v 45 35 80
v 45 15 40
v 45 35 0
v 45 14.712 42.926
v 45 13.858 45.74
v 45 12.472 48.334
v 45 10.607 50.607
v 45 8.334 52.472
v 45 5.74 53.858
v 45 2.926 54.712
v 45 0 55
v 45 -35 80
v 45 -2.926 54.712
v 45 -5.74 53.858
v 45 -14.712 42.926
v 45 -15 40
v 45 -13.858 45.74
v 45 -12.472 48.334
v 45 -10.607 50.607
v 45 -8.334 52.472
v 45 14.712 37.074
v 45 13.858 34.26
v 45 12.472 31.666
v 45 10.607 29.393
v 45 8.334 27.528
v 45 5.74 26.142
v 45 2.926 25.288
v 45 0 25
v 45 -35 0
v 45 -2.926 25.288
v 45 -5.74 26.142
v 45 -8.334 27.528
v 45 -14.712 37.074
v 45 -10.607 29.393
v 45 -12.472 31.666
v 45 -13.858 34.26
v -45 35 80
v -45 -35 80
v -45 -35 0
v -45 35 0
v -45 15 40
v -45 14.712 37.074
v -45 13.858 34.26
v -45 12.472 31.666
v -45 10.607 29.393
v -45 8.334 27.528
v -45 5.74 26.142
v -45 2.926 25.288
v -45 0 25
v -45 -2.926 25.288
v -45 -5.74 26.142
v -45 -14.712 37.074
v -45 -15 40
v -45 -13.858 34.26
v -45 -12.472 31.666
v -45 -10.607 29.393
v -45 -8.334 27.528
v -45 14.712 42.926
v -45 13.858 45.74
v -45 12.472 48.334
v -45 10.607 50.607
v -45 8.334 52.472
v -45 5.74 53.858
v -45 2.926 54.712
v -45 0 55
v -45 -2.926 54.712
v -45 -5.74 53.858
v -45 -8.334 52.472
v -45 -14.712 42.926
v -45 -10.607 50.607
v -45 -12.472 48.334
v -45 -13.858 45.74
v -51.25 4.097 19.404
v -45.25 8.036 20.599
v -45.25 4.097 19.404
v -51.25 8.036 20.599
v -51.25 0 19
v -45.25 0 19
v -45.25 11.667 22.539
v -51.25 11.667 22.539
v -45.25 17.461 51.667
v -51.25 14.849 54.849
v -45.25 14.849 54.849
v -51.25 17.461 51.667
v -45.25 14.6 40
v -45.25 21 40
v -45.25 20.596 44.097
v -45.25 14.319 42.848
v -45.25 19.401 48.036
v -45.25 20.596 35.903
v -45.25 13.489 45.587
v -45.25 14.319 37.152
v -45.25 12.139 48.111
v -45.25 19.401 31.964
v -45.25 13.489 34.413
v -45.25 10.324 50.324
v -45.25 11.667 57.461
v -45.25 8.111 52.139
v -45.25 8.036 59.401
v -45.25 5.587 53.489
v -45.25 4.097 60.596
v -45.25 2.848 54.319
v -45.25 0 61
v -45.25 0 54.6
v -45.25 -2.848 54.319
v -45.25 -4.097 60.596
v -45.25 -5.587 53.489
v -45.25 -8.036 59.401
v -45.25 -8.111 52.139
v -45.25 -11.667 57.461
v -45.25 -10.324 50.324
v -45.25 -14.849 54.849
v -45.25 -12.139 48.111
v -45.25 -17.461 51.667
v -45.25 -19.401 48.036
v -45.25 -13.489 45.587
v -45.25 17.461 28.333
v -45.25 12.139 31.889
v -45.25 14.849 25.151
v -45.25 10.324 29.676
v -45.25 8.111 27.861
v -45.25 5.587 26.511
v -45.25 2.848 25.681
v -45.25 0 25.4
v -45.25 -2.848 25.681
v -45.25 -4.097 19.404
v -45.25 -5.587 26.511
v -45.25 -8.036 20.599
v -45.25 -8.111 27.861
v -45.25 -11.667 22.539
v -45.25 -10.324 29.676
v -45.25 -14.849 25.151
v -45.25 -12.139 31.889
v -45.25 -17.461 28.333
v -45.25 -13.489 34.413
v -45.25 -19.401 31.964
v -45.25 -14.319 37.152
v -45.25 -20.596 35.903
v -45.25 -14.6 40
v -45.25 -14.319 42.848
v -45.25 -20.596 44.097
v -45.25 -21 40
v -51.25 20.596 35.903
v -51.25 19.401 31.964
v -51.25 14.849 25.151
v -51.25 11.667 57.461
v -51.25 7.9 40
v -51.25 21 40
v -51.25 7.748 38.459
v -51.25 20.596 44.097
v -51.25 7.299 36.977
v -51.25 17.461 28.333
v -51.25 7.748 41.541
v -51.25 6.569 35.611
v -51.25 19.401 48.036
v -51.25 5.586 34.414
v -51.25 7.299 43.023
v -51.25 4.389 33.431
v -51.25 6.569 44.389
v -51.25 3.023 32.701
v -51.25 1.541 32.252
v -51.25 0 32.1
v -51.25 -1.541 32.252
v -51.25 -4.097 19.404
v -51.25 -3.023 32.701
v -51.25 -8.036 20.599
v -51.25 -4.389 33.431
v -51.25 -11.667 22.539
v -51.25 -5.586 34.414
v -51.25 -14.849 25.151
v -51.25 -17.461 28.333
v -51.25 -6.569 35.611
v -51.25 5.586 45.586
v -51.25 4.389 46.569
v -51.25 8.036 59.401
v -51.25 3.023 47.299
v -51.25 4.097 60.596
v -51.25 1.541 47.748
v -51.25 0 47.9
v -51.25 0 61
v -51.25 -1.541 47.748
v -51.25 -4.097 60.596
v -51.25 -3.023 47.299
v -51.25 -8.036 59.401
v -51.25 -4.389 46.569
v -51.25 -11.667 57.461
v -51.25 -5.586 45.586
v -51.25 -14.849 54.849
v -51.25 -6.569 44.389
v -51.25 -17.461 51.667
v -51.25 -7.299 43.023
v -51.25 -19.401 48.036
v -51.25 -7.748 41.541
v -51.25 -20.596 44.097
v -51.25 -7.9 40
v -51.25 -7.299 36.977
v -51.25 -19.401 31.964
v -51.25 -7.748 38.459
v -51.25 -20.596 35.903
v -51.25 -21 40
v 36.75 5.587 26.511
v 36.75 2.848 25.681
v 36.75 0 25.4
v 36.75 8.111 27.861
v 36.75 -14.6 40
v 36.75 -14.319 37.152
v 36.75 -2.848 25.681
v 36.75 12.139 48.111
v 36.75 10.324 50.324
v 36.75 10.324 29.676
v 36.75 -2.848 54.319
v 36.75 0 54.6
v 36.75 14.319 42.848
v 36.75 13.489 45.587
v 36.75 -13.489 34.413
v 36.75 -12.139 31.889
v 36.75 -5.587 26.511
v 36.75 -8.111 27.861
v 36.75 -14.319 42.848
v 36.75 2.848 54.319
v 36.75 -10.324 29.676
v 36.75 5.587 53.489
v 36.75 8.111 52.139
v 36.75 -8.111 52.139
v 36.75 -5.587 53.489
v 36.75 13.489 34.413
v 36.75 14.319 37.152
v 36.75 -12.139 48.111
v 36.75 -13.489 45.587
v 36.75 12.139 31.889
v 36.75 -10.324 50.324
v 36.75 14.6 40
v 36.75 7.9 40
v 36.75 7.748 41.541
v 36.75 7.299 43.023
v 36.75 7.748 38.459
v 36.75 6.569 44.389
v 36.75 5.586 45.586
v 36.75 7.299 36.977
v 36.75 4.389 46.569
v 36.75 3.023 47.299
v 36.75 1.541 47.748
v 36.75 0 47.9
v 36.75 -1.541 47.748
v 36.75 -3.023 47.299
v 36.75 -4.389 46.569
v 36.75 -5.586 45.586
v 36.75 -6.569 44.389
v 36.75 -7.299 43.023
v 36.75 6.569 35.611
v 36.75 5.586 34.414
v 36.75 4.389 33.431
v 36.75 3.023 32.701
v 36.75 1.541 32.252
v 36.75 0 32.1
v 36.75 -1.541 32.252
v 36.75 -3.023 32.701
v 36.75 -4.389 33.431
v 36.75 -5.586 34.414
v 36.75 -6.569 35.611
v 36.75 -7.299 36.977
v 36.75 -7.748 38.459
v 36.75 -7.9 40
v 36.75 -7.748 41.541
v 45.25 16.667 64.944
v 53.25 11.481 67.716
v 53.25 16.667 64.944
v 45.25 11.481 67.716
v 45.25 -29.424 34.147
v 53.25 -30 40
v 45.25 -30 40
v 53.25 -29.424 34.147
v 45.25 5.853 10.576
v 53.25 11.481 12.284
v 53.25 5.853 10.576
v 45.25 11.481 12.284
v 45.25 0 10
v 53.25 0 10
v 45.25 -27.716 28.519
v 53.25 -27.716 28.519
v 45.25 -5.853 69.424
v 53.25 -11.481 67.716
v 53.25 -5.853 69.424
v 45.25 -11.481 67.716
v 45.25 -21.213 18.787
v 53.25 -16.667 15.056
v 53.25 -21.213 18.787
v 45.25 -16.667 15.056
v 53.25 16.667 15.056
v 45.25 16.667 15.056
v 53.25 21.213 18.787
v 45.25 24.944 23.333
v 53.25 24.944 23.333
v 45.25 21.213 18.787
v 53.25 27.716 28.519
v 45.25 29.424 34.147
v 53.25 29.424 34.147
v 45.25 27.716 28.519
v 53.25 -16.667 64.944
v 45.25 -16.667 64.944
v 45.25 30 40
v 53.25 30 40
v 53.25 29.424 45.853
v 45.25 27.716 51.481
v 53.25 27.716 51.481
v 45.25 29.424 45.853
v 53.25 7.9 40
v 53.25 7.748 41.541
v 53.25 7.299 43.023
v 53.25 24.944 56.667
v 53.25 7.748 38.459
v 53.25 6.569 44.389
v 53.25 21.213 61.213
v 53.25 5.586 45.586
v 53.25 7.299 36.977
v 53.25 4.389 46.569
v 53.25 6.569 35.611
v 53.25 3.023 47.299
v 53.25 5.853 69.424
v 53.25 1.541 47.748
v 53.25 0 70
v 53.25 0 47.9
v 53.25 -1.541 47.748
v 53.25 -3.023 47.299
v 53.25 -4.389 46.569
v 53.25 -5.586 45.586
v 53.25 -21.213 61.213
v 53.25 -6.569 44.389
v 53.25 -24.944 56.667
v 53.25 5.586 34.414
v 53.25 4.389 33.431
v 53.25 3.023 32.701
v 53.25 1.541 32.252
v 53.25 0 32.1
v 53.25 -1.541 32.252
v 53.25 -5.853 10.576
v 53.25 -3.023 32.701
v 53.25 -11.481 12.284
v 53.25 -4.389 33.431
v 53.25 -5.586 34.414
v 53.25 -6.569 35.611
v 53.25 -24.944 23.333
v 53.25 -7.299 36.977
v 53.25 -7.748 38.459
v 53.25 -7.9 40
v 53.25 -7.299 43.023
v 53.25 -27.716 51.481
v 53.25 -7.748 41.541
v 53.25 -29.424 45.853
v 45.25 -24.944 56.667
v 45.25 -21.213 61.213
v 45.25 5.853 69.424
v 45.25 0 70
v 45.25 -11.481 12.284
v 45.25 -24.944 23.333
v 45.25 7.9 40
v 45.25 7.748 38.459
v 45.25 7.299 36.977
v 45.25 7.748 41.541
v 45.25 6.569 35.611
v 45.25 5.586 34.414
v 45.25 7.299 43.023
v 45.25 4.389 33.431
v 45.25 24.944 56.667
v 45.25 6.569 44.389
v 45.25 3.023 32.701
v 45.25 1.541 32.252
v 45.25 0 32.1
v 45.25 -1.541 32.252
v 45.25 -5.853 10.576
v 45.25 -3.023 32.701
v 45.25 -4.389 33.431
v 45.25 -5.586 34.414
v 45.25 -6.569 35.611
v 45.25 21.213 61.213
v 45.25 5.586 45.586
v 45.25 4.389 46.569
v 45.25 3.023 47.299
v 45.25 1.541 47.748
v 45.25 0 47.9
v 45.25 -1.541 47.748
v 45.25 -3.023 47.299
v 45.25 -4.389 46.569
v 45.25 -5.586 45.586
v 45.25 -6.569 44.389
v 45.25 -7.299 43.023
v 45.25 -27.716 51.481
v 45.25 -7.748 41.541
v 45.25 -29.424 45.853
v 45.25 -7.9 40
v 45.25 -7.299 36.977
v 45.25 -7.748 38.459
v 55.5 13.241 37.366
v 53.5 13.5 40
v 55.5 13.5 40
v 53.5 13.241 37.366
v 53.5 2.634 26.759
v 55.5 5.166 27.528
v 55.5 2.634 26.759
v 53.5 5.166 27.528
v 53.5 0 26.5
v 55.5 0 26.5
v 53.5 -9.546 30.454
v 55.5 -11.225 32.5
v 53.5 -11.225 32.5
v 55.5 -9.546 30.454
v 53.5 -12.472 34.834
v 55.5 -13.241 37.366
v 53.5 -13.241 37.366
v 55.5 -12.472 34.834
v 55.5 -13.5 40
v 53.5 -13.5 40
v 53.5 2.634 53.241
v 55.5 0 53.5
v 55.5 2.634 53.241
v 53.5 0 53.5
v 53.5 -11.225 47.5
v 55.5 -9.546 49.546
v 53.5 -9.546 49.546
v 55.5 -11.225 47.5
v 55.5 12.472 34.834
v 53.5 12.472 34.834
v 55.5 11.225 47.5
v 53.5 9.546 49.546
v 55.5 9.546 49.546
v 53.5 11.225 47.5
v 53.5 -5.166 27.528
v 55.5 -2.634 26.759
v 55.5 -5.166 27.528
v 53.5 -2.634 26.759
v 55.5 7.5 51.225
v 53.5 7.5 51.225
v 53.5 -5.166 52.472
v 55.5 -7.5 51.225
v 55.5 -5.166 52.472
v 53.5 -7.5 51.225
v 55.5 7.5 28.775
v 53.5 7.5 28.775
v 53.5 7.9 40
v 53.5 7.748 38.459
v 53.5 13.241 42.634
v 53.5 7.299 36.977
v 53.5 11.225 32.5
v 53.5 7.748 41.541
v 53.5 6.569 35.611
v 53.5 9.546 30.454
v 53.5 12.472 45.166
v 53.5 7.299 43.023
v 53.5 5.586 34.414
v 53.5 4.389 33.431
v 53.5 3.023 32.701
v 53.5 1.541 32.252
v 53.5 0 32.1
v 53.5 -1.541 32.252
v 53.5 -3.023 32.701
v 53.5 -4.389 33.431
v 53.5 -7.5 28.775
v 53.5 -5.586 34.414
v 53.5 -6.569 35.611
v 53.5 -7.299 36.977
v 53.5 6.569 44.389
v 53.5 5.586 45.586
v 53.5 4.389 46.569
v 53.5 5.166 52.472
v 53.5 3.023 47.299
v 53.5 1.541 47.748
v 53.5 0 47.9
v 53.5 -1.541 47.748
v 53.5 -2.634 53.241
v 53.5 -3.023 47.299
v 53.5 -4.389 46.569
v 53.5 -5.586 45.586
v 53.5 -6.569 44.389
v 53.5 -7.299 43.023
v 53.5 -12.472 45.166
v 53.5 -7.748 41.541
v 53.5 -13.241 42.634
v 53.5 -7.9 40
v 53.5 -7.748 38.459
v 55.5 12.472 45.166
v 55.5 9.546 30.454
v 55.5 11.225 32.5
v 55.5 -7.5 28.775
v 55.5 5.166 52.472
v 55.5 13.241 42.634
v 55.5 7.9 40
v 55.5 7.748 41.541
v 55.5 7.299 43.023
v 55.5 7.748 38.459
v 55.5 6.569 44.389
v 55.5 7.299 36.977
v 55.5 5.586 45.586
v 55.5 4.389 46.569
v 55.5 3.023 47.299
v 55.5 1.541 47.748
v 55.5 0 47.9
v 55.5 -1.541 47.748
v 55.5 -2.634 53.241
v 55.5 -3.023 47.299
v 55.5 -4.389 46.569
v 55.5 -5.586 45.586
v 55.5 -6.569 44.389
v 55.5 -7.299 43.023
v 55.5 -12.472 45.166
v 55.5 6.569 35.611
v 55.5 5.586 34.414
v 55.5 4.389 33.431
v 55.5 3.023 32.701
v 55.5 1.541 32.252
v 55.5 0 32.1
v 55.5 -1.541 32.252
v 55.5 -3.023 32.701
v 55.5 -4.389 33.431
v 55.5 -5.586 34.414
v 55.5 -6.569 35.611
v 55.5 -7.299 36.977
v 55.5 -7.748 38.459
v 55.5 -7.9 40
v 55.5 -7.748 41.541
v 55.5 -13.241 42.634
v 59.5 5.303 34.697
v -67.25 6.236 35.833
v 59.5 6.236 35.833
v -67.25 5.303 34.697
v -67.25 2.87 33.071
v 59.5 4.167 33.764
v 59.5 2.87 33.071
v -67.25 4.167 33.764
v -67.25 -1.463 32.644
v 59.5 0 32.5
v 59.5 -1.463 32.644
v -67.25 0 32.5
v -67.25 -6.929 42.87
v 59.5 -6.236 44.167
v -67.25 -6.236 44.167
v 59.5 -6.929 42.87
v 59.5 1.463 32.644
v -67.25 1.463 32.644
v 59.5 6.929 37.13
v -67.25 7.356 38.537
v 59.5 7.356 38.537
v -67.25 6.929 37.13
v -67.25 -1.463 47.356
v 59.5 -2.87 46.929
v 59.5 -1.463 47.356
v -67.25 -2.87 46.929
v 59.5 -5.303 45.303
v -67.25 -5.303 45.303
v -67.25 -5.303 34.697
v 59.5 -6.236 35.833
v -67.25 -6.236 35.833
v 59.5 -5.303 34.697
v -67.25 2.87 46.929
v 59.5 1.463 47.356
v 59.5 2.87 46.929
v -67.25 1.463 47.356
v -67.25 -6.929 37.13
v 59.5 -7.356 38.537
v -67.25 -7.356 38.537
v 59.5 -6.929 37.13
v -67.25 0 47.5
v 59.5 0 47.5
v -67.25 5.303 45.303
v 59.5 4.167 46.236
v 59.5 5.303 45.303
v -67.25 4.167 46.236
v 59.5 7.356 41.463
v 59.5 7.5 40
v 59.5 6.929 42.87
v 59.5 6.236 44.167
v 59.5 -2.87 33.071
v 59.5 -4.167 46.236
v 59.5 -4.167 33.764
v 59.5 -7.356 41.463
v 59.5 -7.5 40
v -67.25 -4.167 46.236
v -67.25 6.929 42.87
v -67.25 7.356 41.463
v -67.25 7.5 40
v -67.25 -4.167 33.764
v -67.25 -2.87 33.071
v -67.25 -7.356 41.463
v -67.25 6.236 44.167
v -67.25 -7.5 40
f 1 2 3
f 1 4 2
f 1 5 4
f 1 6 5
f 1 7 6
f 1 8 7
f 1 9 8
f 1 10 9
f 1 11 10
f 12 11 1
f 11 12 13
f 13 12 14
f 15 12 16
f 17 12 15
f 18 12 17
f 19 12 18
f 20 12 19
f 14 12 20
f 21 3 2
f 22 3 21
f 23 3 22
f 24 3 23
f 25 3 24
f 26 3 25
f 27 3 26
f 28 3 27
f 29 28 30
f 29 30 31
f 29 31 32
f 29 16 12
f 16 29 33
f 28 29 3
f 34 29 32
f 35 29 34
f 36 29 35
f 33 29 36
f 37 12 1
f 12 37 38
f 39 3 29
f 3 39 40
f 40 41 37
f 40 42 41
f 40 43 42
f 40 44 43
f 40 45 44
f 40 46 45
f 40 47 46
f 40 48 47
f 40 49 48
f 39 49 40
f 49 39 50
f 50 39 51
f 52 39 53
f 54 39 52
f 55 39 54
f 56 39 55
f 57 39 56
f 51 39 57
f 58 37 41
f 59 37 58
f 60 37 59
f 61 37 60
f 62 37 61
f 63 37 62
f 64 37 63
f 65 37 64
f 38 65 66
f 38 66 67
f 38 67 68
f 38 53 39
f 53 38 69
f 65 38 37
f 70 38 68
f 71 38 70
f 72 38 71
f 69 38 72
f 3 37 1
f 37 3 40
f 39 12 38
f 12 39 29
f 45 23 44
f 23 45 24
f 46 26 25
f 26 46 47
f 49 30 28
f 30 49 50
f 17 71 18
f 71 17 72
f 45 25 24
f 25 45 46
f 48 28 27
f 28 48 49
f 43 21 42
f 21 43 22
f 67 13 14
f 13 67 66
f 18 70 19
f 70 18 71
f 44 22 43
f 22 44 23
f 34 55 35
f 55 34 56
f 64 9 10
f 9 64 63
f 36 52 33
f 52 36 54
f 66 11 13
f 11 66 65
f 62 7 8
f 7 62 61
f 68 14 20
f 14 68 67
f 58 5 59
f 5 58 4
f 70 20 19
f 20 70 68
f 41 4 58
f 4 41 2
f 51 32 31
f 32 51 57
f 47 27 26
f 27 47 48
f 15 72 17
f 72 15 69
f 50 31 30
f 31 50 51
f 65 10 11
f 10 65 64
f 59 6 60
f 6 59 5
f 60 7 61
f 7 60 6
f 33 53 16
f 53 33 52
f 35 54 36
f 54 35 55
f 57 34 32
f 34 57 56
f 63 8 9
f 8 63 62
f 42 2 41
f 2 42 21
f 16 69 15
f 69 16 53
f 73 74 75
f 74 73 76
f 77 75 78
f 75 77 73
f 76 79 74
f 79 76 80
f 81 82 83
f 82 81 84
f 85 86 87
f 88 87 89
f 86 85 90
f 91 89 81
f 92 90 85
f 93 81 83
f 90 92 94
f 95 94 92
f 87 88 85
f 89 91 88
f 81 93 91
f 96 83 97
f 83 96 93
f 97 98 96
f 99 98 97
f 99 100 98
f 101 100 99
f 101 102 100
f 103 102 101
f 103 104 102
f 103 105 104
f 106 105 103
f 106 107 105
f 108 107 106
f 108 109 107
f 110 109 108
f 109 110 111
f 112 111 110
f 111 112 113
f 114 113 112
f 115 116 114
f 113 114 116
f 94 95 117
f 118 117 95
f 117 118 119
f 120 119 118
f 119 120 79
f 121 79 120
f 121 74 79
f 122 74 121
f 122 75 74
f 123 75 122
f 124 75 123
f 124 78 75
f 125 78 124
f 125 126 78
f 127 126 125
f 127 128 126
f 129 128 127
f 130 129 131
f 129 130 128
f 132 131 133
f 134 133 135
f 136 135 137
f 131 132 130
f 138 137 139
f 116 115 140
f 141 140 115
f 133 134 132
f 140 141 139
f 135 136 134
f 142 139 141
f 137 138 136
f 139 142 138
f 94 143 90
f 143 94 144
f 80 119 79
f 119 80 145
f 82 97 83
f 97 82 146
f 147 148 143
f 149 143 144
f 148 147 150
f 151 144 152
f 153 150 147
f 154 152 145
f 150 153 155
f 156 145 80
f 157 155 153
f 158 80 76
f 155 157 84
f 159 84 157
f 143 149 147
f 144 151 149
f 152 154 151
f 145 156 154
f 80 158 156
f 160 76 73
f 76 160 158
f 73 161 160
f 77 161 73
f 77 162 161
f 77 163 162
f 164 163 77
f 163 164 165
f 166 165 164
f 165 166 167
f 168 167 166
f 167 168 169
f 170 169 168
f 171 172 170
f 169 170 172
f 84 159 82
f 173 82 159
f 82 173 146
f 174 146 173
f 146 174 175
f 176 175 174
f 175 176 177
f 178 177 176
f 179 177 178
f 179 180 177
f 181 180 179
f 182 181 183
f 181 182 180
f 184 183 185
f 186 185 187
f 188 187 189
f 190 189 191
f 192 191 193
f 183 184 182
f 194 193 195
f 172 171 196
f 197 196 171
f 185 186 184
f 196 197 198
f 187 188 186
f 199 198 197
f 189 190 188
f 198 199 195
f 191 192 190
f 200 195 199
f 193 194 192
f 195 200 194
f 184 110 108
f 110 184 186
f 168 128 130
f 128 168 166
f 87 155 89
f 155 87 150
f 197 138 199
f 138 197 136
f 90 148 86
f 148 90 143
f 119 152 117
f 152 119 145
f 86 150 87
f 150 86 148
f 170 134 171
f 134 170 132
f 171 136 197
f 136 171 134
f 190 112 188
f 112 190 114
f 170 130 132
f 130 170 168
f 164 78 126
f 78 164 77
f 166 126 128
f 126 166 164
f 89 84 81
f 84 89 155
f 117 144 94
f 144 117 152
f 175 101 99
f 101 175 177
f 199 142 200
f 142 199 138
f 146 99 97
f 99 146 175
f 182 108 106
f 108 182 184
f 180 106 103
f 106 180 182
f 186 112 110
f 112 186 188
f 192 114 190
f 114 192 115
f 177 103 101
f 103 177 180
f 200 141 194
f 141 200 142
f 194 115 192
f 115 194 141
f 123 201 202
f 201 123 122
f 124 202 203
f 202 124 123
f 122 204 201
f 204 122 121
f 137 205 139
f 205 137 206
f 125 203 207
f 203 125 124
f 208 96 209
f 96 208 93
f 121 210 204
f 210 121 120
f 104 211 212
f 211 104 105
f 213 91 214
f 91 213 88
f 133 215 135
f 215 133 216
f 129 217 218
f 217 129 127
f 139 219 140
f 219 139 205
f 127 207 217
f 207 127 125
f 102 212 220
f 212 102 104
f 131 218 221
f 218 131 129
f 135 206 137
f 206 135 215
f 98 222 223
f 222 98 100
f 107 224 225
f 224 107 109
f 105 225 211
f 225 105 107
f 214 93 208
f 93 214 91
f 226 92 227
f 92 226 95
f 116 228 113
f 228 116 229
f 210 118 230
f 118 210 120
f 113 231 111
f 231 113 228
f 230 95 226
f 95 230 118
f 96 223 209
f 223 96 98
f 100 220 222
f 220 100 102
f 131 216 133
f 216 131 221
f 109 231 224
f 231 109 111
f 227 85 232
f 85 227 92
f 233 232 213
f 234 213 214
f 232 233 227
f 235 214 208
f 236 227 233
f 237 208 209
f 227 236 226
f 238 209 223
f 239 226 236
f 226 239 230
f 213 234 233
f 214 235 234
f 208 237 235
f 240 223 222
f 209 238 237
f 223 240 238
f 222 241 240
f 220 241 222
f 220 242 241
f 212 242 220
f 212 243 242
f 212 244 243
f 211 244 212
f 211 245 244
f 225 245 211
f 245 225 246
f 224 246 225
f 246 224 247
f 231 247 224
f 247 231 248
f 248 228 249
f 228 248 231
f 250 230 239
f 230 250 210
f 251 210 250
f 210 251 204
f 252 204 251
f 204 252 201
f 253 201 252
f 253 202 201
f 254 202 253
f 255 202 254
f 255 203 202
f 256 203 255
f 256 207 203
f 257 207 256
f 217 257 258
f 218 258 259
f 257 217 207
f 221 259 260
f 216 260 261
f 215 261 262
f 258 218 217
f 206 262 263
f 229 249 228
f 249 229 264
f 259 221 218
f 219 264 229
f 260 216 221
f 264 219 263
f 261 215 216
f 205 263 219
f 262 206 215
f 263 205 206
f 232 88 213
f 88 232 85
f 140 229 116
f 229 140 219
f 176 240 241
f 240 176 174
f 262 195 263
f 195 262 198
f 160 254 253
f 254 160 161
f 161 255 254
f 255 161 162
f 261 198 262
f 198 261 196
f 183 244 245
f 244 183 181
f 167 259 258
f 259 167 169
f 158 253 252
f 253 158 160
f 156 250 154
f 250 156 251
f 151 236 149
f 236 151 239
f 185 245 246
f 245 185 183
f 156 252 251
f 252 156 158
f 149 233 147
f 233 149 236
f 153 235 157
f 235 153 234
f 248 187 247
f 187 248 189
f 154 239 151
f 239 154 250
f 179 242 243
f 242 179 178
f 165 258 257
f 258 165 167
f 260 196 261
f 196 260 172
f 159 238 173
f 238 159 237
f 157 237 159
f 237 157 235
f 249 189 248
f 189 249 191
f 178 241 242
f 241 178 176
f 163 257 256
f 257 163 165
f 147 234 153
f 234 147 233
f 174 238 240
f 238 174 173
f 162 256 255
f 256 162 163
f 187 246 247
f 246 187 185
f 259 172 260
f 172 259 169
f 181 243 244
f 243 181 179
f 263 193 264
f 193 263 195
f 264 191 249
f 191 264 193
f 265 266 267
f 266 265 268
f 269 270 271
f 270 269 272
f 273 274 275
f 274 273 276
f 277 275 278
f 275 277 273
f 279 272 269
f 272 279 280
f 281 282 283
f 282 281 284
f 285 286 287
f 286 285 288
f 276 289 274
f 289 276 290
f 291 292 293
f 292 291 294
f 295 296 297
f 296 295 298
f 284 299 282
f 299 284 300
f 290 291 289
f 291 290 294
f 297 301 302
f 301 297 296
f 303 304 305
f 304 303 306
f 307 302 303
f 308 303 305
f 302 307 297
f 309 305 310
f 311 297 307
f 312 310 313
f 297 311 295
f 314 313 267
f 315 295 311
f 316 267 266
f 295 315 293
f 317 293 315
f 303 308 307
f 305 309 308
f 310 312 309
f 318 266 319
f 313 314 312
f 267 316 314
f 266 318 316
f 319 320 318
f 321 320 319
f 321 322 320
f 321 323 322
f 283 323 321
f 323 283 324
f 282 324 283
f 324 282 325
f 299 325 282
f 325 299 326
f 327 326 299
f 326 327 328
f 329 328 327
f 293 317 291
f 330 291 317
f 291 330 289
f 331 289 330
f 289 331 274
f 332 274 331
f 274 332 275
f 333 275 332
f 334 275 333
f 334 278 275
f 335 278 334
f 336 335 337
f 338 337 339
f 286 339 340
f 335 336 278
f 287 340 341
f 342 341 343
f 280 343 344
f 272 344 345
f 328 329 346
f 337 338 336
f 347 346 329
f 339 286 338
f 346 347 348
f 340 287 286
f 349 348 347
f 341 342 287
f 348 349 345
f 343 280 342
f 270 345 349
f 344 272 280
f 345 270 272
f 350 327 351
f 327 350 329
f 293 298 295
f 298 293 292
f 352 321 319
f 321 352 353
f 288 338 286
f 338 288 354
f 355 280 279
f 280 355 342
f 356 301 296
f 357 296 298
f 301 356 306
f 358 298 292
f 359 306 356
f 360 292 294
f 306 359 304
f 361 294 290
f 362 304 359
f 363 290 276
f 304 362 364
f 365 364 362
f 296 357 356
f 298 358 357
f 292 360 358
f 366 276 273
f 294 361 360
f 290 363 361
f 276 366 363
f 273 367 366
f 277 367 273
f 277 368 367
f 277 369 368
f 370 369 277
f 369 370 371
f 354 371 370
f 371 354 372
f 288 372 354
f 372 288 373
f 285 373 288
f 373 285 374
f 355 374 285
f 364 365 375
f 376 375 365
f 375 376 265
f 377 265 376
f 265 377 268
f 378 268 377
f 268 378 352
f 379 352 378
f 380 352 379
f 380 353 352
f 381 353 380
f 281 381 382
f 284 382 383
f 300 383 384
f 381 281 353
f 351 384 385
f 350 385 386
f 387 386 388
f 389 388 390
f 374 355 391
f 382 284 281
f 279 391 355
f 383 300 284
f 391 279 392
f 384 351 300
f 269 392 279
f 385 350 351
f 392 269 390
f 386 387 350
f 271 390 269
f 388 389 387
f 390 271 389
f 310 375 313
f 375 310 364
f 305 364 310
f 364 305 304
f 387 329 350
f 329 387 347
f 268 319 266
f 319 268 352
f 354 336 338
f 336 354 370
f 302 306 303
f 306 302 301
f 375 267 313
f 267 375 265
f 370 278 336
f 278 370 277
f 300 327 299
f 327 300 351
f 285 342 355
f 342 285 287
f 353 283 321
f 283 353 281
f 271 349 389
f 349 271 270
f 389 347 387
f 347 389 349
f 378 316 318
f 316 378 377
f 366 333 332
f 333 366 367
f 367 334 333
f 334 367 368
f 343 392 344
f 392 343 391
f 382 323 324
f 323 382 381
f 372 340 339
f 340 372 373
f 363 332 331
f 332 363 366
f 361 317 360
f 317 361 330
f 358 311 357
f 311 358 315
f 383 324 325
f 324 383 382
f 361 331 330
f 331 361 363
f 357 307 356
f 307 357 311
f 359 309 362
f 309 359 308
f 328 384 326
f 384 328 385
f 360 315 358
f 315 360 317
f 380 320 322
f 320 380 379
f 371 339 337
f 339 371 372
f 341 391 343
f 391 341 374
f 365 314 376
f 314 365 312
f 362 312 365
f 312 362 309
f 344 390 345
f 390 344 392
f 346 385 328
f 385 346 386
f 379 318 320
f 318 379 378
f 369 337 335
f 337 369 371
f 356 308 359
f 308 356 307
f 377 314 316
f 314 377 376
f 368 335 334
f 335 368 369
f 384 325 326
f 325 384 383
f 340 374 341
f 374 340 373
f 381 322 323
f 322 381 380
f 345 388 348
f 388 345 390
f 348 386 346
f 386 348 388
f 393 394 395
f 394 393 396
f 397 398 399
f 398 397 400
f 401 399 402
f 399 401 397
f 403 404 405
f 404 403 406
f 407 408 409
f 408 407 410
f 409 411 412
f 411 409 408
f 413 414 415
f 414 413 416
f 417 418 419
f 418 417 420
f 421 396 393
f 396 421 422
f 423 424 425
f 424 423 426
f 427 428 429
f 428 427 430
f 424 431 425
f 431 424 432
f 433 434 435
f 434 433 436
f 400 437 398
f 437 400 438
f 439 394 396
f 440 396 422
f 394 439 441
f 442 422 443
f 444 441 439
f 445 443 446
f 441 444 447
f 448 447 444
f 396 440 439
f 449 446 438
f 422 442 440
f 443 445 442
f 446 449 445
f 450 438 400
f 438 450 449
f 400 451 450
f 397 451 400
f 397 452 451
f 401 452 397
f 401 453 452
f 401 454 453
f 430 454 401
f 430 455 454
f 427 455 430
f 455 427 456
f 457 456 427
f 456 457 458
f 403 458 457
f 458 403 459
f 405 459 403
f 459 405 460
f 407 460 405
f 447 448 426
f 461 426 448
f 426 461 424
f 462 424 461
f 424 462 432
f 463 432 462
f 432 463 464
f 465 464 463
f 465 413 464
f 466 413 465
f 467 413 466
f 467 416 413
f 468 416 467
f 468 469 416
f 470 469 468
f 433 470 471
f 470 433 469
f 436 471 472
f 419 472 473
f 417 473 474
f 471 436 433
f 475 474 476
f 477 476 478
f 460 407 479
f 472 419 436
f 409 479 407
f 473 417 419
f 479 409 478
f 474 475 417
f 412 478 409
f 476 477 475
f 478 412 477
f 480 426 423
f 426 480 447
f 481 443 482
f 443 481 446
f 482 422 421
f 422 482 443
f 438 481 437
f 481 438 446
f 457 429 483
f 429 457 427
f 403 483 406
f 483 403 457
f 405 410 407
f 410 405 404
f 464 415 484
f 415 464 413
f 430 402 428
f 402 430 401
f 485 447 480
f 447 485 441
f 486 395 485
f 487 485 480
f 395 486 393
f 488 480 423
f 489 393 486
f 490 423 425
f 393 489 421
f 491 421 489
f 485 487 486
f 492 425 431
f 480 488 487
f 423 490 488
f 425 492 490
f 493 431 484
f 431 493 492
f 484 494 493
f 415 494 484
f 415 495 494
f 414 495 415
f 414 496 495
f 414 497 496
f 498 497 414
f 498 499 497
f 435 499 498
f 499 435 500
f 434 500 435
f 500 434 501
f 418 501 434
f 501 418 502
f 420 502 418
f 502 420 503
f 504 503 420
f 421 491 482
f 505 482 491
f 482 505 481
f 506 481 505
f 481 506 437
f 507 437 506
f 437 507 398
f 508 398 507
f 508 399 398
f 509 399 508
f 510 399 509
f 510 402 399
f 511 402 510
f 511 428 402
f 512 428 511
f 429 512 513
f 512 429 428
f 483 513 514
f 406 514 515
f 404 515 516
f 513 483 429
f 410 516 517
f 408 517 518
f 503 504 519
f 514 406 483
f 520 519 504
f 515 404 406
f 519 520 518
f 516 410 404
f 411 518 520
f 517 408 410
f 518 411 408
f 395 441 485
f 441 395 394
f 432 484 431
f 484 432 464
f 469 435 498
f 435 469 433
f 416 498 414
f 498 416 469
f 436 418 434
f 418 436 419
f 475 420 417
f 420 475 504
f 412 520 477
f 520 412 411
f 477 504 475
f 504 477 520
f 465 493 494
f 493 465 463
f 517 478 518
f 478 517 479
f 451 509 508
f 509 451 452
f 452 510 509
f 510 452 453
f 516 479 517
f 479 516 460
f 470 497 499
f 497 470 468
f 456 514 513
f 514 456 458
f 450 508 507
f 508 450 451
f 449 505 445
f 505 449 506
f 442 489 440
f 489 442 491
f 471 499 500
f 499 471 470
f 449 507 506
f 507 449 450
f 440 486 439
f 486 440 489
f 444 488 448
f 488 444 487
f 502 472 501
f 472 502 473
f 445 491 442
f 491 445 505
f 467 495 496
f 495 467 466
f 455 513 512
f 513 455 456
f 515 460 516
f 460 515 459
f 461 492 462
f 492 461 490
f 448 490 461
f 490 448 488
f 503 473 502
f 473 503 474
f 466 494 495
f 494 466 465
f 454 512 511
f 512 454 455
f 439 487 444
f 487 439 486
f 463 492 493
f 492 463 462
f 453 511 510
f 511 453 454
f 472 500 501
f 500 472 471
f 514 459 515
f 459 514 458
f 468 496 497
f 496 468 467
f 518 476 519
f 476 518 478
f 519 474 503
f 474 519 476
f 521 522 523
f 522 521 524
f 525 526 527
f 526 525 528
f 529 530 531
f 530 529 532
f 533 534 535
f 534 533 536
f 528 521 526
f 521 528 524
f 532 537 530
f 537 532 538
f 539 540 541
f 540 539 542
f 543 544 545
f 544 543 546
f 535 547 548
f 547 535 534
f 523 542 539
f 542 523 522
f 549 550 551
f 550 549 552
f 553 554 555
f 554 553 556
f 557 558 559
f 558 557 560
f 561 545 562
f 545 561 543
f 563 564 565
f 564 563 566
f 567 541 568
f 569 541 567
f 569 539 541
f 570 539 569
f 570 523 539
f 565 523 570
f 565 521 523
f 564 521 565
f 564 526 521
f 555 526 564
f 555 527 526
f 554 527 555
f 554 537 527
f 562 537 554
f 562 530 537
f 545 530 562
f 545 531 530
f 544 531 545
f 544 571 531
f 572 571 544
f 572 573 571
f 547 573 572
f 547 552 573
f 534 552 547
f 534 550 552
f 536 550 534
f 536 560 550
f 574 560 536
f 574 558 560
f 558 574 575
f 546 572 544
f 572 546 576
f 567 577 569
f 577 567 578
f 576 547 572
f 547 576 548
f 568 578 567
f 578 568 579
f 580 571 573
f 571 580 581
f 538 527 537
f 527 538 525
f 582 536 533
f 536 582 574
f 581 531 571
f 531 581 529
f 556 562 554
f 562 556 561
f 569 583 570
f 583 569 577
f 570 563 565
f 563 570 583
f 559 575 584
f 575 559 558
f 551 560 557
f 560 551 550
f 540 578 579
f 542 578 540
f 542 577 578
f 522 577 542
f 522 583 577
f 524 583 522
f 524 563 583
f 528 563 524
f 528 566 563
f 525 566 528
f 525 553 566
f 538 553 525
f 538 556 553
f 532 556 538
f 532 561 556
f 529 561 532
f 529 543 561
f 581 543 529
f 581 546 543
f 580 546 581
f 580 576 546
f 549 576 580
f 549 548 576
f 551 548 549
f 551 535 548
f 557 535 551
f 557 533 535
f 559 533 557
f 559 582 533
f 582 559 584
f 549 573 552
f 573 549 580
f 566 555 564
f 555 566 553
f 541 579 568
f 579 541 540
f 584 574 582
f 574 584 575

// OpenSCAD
$fn = 32;

// ------------------------------------------------------------------------
// Bushed housing: 90 x 70 x 80 mm housing, bushing d29.2
// Every part is its own module, assembly() places them once.
// ------------------------------------------------------------------------

// --- part 1 ---
module housing() {
  difference() {
    translate([-45, -35, 0]) cube([90, 70, 80]);
    translate([0, 0, 40]) rotate([0, 90, 0]) cylinder(h = 92, d = 30, center = true);
  }
}

// --- part 2 ---
module bushing() {
  difference() {
    union() {
      cylinder(h = 6, d = 42);
      translate([0, 0, 6]) cylinder(h = 82, d = 29.2);
    }
    translate([0, 0, -1]) cylinder(h = 90, d = 15.8);
  }
}

// --- part 3 ---
module shaft() {
  translate([0, 0, -63.375]) cylinder(h = 126.75, d = 15);
}

// --- part 4 ---
module cover() {
  difference() {
    cylinder(h = 8, d = 60);
    translate([0, 0, -1]) cylinder(h = 10, d = 15.8);
  }
}

// --- part 5 ---
module washer() {
  difference() {
      translate([0, 0, 0]) cylinder(h = 2, d = 27);
      translate([0, 0, -1]) cylinder(h = 4, d = 15.8);
    }
}

// --- assembly ---
module assembly() {
  translate([0, 0, 0]) rotate([0, 0, 0]) housing();
  translate([-51.25, 0, 40]) rotate([0, 90, 0]) bushing();
  translate([-3.875, 0, 40]) rotate([0, 90, 0]) shaft();
  translate([45.25, 0, 40]) rotate([0, 90, 0]) cover();
  translate([53.5, 0, 40]) rotate([0, 90, 0]) washer();
}

assembly();
